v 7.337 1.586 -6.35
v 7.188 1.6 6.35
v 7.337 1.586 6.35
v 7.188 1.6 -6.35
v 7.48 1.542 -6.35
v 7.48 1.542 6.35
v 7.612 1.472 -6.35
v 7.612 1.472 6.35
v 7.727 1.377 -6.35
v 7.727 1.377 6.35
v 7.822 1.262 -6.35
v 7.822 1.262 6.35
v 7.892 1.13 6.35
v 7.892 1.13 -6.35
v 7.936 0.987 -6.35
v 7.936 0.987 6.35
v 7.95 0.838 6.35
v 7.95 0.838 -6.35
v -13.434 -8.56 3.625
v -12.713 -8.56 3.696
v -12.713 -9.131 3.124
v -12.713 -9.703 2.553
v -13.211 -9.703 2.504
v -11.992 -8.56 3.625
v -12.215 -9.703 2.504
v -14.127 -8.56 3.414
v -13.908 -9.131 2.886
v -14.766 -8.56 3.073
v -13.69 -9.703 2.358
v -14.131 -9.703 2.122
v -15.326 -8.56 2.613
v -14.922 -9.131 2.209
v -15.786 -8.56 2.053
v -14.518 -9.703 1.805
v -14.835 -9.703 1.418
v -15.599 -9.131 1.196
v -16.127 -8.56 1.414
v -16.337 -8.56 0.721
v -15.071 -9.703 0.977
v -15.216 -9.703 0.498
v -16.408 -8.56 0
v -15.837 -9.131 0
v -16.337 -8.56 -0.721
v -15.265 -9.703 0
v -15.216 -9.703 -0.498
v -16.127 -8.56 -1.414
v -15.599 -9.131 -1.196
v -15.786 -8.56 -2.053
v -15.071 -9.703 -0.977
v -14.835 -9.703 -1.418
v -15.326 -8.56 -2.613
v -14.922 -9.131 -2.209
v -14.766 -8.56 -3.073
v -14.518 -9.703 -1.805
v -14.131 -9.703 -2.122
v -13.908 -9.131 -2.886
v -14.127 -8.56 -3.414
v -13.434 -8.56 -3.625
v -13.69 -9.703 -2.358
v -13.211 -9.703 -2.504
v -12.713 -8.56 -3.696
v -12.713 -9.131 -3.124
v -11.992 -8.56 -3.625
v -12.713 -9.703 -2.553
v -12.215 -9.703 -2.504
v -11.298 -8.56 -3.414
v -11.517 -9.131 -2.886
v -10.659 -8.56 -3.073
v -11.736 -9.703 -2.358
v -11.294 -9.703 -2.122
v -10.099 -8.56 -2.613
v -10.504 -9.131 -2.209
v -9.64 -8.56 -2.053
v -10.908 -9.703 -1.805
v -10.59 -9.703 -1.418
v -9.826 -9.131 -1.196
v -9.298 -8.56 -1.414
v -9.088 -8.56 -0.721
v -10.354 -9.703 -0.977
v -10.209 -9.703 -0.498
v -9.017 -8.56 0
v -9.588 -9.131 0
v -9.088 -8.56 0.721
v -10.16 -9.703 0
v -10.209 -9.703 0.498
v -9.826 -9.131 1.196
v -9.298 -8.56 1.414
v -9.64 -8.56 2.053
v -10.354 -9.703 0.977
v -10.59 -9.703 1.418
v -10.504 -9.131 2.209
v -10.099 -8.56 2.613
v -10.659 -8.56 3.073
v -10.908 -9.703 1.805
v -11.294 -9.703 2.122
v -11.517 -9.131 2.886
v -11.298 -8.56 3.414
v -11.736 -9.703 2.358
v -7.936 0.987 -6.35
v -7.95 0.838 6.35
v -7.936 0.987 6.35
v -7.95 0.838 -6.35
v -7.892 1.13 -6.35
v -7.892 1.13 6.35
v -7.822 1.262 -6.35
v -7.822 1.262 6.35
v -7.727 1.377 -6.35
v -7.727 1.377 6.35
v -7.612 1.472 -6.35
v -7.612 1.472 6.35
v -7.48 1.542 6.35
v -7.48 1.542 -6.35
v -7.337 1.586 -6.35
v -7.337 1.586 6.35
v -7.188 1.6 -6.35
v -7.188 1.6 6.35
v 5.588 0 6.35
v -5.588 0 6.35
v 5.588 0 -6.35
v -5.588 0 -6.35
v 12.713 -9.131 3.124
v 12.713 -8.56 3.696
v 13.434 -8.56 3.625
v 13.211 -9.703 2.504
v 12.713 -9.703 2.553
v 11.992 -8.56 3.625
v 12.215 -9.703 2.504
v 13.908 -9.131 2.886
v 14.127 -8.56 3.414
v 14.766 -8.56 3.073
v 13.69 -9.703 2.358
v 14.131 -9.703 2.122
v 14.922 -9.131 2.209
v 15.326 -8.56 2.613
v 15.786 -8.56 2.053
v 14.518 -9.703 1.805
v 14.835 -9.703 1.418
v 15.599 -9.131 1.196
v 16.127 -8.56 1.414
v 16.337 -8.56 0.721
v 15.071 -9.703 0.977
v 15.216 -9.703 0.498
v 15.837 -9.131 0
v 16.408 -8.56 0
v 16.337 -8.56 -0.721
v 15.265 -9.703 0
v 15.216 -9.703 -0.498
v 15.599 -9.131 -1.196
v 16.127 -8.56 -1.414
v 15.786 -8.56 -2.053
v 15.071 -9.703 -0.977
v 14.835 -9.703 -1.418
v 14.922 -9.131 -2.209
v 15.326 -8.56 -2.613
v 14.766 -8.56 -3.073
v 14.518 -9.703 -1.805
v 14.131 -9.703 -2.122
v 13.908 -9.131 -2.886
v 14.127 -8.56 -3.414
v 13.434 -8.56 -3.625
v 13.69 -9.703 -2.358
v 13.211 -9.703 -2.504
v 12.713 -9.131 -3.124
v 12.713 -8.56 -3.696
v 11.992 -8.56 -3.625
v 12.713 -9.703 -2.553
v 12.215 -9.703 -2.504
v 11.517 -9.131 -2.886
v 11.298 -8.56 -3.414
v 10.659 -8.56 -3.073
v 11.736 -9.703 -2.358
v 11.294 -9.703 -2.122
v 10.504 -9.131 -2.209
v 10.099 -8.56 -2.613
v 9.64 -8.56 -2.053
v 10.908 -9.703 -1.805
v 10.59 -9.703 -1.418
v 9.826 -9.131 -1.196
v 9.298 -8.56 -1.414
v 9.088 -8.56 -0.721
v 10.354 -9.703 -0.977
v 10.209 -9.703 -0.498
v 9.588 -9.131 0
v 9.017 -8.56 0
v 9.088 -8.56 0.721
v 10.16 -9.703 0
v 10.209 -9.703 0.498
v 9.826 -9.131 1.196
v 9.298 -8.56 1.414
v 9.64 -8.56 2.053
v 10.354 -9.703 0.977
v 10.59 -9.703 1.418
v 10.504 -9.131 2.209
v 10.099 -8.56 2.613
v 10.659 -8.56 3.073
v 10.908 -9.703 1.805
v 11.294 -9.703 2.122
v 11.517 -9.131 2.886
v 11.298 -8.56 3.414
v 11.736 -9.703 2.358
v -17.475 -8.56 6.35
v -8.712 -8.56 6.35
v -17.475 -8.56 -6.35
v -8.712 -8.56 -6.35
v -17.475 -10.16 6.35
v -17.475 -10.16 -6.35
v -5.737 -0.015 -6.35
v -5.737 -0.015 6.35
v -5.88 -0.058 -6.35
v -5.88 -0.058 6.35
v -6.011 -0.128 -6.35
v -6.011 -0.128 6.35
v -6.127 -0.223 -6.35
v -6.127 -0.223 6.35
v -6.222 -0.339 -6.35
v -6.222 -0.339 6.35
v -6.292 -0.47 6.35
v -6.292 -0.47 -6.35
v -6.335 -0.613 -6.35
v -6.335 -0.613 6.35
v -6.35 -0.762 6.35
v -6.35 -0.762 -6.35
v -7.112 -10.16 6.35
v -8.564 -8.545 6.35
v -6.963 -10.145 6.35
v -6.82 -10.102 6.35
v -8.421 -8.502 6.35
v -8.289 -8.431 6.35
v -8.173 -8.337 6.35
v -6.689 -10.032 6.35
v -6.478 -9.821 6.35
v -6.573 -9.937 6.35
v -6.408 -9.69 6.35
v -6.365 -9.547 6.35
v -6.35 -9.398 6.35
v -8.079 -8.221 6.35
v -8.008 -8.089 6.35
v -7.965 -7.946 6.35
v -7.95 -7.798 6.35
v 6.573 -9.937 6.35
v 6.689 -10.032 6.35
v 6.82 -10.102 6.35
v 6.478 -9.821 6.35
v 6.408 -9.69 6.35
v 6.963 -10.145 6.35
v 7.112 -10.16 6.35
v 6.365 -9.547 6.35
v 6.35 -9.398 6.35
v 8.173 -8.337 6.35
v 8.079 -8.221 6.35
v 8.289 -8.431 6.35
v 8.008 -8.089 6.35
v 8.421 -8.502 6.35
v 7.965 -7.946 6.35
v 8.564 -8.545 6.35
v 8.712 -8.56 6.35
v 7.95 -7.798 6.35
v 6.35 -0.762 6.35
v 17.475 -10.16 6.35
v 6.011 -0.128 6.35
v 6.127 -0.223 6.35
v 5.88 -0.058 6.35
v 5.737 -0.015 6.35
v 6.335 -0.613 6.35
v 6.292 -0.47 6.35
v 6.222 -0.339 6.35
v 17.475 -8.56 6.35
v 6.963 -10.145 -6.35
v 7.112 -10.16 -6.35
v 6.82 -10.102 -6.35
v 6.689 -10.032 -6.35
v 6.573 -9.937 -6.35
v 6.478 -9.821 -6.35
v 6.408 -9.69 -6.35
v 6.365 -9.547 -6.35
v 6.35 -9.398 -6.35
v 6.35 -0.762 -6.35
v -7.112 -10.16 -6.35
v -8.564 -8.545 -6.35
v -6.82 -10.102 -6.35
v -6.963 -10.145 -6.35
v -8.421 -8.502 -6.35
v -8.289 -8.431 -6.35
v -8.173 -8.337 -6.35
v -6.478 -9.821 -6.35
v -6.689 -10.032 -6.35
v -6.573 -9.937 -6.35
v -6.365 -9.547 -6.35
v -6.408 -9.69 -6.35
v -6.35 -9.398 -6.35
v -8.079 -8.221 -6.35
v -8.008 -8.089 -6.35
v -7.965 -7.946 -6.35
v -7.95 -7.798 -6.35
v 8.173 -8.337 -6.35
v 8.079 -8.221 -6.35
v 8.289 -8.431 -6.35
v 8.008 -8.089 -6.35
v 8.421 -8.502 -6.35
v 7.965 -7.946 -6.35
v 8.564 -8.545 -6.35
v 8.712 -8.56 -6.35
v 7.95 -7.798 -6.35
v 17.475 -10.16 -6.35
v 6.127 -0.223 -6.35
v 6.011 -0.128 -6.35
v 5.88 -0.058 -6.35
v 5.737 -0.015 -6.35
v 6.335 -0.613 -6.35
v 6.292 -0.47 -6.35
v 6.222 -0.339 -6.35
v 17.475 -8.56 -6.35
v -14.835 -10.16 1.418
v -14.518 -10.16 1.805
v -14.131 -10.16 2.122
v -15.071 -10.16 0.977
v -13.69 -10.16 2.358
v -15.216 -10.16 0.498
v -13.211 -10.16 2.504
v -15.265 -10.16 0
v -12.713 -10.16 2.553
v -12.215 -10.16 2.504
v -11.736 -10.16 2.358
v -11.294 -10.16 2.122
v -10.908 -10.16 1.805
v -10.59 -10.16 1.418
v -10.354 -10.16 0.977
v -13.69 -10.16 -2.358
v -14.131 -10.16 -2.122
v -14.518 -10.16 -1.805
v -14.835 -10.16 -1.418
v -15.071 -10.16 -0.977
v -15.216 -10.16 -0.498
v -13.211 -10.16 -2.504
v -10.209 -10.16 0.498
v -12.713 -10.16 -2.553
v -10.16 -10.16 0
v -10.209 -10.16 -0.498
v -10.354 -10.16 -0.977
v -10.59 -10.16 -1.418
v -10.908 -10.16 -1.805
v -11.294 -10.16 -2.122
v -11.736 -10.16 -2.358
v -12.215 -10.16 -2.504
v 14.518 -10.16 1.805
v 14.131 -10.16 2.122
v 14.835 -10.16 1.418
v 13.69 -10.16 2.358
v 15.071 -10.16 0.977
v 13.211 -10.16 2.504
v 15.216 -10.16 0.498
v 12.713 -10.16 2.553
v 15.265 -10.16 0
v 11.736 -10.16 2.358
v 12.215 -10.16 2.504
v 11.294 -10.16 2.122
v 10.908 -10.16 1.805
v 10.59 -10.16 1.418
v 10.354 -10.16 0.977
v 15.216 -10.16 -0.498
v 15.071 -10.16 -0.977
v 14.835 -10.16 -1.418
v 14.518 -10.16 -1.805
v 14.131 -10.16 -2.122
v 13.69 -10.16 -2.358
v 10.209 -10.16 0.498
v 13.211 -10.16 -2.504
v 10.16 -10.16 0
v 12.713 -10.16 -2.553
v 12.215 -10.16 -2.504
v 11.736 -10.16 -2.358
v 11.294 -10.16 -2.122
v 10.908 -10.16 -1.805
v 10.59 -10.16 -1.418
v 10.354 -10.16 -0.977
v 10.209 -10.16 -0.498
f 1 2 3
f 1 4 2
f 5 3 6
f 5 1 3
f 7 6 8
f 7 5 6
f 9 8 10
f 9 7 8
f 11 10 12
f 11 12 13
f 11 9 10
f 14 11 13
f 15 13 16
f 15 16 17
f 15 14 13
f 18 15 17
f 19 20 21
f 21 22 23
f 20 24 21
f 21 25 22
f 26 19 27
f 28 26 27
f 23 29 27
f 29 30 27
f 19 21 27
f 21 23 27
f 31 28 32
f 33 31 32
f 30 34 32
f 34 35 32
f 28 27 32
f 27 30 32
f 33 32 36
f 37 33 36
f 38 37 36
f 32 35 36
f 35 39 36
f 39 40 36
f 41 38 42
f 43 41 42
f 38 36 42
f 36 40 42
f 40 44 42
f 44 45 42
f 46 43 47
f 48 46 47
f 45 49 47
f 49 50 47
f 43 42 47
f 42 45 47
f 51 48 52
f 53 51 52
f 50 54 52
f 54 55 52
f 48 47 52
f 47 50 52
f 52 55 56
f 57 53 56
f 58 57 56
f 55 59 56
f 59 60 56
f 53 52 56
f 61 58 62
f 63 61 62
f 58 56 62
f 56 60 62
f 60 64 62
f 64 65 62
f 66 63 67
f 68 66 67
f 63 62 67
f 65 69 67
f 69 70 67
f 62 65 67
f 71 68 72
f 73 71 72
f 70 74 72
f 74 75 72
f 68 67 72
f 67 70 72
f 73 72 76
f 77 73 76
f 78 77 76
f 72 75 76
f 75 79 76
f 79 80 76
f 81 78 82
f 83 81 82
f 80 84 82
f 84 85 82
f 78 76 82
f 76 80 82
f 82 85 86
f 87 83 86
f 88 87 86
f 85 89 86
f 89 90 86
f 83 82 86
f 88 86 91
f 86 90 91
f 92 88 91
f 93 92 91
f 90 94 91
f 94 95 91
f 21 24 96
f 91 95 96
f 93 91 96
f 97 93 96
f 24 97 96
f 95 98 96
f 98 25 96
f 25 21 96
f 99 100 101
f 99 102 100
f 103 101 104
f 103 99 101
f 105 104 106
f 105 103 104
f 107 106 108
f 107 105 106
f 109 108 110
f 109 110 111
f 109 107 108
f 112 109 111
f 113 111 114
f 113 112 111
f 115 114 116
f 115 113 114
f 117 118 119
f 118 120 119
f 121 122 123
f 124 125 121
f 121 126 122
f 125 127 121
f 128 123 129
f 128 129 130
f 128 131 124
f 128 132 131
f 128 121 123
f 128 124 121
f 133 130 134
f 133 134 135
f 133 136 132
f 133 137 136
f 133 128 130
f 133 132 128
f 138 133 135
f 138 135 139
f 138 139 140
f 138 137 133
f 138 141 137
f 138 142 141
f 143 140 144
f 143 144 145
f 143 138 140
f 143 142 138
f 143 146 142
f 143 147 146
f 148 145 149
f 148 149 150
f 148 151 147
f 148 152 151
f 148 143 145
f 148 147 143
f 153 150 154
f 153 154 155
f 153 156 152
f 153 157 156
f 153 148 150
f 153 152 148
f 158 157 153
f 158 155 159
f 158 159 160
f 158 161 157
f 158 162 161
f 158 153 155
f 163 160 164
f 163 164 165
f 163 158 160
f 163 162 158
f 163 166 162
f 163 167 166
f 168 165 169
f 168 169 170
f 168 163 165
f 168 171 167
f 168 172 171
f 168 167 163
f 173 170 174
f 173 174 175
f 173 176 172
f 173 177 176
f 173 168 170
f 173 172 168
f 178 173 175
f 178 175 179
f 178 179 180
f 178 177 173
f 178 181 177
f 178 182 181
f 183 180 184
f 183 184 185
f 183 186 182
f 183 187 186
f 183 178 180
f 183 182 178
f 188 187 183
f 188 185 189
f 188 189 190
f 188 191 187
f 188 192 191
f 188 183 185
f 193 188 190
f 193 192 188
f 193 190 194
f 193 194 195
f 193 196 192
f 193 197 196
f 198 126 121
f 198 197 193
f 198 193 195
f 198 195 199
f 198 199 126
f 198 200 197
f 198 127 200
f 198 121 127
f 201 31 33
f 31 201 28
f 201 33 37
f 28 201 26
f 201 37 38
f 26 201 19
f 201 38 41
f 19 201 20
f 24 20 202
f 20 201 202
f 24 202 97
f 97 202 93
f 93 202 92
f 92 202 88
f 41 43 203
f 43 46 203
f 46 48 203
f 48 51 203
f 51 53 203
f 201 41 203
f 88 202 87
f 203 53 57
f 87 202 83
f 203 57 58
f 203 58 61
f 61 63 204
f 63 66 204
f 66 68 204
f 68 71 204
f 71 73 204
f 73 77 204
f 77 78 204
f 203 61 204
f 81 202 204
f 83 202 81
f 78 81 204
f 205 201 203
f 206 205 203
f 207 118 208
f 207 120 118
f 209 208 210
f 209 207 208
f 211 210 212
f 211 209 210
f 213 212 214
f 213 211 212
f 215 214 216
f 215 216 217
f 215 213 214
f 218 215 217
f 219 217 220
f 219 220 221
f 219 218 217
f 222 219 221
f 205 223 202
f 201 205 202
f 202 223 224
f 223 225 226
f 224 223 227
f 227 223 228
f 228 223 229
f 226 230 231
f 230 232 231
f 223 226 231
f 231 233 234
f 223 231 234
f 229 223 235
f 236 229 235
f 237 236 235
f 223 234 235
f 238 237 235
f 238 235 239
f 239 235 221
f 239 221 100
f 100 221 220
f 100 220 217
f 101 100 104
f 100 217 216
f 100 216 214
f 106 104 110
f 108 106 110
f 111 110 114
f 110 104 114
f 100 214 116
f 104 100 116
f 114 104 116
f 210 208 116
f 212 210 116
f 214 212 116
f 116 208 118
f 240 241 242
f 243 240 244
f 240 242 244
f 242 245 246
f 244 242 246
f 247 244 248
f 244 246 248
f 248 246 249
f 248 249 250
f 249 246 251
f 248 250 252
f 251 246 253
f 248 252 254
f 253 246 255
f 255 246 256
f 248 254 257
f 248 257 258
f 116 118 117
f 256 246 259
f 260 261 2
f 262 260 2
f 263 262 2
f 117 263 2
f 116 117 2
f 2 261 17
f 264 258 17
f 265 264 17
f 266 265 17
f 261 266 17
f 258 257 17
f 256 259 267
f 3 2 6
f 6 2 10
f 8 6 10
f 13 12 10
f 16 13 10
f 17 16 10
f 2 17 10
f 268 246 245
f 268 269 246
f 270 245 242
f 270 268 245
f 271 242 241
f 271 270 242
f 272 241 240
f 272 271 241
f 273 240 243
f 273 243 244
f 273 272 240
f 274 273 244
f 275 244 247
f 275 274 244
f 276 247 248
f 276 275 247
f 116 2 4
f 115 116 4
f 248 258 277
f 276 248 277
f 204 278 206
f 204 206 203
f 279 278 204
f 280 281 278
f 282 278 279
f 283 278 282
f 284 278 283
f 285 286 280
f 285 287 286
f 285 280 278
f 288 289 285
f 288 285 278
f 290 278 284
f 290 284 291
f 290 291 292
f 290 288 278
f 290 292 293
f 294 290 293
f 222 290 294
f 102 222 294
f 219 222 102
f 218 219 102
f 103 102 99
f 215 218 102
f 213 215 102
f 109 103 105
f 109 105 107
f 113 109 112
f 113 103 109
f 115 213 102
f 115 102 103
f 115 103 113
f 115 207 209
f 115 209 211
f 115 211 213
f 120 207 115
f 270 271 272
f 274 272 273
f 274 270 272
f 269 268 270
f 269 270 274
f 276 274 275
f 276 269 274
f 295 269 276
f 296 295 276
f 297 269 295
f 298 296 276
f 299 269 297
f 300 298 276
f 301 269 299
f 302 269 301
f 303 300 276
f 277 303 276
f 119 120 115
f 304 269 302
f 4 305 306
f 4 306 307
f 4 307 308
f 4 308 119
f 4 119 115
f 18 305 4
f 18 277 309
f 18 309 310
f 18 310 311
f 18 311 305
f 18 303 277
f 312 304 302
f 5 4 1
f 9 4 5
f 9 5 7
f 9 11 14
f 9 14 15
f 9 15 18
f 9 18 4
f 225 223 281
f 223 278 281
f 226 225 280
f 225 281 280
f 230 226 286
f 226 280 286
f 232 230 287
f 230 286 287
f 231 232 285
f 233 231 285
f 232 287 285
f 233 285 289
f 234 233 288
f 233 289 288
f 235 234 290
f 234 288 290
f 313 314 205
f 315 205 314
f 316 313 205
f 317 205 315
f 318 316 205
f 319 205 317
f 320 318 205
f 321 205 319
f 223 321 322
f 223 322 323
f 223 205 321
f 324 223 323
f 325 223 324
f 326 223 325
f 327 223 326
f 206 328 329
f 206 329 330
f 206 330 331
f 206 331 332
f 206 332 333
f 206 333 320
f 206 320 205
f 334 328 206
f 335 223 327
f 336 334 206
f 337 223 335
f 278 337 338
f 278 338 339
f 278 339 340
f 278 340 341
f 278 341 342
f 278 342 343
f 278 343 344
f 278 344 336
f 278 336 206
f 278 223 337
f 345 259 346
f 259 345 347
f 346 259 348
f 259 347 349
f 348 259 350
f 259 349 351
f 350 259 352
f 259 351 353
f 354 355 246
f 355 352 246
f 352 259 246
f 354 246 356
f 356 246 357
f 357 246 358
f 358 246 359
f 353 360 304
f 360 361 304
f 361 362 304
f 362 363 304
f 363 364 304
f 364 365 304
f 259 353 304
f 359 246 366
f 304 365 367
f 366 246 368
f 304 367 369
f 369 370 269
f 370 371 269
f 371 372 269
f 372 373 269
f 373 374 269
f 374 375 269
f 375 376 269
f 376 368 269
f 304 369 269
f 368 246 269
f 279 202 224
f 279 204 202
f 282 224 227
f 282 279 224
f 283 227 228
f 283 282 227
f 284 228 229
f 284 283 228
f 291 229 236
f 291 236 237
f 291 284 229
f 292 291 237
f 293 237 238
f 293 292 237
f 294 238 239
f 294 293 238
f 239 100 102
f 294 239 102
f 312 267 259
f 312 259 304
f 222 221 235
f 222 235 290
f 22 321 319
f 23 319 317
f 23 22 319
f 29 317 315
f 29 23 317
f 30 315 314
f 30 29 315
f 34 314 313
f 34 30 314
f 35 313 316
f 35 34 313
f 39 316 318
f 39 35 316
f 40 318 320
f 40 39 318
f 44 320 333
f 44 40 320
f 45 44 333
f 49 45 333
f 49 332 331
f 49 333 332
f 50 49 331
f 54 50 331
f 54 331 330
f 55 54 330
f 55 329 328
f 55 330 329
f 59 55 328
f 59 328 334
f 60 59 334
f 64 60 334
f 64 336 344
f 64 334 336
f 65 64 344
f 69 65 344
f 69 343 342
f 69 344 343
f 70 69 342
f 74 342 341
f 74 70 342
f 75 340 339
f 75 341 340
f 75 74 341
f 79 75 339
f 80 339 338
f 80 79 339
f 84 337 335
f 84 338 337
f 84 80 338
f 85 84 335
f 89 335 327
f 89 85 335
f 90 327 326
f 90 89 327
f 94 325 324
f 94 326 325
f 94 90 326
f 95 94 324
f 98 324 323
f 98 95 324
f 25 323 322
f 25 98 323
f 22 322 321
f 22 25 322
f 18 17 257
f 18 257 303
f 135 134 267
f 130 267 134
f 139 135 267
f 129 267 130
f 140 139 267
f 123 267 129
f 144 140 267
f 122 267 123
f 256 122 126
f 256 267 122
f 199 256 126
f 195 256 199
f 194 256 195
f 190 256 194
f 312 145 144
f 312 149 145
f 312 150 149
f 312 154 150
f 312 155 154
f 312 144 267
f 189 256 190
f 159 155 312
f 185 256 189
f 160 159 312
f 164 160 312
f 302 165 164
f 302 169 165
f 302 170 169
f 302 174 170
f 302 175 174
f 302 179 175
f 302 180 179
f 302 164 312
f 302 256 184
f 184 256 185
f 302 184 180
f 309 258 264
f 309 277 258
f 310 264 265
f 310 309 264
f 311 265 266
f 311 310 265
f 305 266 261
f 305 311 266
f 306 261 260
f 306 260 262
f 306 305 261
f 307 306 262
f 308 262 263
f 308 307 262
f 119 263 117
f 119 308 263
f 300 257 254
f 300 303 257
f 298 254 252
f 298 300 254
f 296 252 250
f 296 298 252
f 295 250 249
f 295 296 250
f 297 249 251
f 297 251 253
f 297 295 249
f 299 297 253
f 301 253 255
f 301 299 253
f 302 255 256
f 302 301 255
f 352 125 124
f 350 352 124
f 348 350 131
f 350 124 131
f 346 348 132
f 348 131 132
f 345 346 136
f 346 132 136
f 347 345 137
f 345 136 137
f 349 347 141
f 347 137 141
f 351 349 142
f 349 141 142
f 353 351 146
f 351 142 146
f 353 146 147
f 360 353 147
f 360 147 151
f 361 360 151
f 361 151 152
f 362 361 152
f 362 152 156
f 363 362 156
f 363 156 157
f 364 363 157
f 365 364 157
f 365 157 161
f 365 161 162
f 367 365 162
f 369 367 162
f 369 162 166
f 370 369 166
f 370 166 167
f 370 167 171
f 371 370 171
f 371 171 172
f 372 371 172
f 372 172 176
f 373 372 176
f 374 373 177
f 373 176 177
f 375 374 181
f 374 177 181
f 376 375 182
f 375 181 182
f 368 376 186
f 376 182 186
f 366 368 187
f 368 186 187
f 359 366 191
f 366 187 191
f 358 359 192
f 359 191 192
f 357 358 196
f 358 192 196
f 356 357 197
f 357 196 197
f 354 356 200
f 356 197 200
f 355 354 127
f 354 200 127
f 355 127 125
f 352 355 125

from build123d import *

# Parameters (mm, degrees)
SKETCH1_W           = 12.7
SKETCH1_H           = 12.7
BOSS_EXTRUDE1_DEPTH = 1.6002
SKETCH2_W           = 12.7
SKETCH2_H           = 11.7602
BOSS_EXTRUDE2_DEPTH = 1.6002
SKETCH3_W           = 12.7
SKETCH3_H           = 1.6002
BOSS_EXTRUDE3_DEPTH = 9.525
SKETCH4_R           = 2.5527
CUT_EXTRUDE1_DEPTH  = 22.187985158
FILLET1_R           = 0.762
CHAMFER2_SIZE       = 1.143


with BuildPart() as part:
    # Sketch1 → Boss-Extrude1 (new body)
    with BuildSketch(Plane(origin=(0, 0, 0), x_dir=(1, 0, 0), z_dir=(0, 1, 0))):
        Rectangle(SKETCH1_W, SKETCH1_H)
    extrude(amount=BOSS_EXTRUDE1_DEPTH)

    # Sketch2 → Boss-Extrude2 (add)
    with BuildSketch(Plane(origin=(6.35, 0, 0), x_dir=(0, 0, -1), z_dir=(1, 0, 0))):
        with Locations((0, -4.2799)):
            Rectangle(SKETCH2_W, SKETCH2_H)
    boss_extrude2 = extrude(amount=BOSS_EXTRUDE2_DEPTH)

    # Sketch3 → Boss-Extrude3 (add)
    with BuildSketch(Plane(origin=(7.9502, 0, 0), x_dir=(0, 0, -1), z_dir=(1, 0, 0))):
        with Locations((0, -9.3599)):
            Rectangle(SKETCH3_W, SKETCH3_H)
    boss_extrude3 = extrude(amount=BOSS_EXTRUDE3_DEPTH)

    # Sketch4 → Cut-Extrude1 (cut, through all)
    with BuildSketch(Plane(origin=(0, -8.5598, 0), x_dir=(1, 0, 0), z_dir=(0, 1, 0))):
        with Locations(Location((12.7127, 0, 0), (0, 0, 270))):
            Circle(SKETCH4_R)
    cut_extrude1 = extrude(amount=-CUT_EXTRUDE1_DEPTH, mode=Mode.SUBTRACT)

    # Mirror2: Boss-Extrude2, Boss-Extrude3, Cut-Extrude1 across plane
    add(boss_extrude2.mirror(Plane(origin=(0, 0, 0), x_dir=(0, 0, 1), z_dir=(1, 0, 0))))
    add(boss_extrude3.mirror(Plane(origin=(0, 0, 0), x_dir=(0, 0, 1), z_dir=(1, 0, 0))))
    add(cut_extrude1.mirror(Plane(origin=(0, 0, 0), x_dir=(0, 0, 1), z_dir=(1, 0, 0))), mode=Mode.SUBTRACT)

    # Fillet1
    fillet1_edges = [part.edges().sort_by_distance(p)[0] for p in [
        (6.35, -10.16, 0),
        (-6.35, -10.16, 0),
        (6.35, 0, 0),
        (-6.35, 0, 0),
        (-7.9502, -8.5598, 0),
        (-7.9502, 1.6002, 0),
        (7.9502, 1.6002, 0),
        (7.9502, -8.5598, 0),
    ]]
    fillet(fillet1_edges, radius=FILLET1_R)

    # Chamfer2
    chamfer2_edges = [part.edges().sort_by_distance(p)[0] for p in [
        (12.7127, -8.5598, -2.5527),
        (-12.7127, -8.5598, -2.5527),
    ]]
    chamfer(chamfer2_edges, length=CHAMFER2_SIZE)


solid = part.part
